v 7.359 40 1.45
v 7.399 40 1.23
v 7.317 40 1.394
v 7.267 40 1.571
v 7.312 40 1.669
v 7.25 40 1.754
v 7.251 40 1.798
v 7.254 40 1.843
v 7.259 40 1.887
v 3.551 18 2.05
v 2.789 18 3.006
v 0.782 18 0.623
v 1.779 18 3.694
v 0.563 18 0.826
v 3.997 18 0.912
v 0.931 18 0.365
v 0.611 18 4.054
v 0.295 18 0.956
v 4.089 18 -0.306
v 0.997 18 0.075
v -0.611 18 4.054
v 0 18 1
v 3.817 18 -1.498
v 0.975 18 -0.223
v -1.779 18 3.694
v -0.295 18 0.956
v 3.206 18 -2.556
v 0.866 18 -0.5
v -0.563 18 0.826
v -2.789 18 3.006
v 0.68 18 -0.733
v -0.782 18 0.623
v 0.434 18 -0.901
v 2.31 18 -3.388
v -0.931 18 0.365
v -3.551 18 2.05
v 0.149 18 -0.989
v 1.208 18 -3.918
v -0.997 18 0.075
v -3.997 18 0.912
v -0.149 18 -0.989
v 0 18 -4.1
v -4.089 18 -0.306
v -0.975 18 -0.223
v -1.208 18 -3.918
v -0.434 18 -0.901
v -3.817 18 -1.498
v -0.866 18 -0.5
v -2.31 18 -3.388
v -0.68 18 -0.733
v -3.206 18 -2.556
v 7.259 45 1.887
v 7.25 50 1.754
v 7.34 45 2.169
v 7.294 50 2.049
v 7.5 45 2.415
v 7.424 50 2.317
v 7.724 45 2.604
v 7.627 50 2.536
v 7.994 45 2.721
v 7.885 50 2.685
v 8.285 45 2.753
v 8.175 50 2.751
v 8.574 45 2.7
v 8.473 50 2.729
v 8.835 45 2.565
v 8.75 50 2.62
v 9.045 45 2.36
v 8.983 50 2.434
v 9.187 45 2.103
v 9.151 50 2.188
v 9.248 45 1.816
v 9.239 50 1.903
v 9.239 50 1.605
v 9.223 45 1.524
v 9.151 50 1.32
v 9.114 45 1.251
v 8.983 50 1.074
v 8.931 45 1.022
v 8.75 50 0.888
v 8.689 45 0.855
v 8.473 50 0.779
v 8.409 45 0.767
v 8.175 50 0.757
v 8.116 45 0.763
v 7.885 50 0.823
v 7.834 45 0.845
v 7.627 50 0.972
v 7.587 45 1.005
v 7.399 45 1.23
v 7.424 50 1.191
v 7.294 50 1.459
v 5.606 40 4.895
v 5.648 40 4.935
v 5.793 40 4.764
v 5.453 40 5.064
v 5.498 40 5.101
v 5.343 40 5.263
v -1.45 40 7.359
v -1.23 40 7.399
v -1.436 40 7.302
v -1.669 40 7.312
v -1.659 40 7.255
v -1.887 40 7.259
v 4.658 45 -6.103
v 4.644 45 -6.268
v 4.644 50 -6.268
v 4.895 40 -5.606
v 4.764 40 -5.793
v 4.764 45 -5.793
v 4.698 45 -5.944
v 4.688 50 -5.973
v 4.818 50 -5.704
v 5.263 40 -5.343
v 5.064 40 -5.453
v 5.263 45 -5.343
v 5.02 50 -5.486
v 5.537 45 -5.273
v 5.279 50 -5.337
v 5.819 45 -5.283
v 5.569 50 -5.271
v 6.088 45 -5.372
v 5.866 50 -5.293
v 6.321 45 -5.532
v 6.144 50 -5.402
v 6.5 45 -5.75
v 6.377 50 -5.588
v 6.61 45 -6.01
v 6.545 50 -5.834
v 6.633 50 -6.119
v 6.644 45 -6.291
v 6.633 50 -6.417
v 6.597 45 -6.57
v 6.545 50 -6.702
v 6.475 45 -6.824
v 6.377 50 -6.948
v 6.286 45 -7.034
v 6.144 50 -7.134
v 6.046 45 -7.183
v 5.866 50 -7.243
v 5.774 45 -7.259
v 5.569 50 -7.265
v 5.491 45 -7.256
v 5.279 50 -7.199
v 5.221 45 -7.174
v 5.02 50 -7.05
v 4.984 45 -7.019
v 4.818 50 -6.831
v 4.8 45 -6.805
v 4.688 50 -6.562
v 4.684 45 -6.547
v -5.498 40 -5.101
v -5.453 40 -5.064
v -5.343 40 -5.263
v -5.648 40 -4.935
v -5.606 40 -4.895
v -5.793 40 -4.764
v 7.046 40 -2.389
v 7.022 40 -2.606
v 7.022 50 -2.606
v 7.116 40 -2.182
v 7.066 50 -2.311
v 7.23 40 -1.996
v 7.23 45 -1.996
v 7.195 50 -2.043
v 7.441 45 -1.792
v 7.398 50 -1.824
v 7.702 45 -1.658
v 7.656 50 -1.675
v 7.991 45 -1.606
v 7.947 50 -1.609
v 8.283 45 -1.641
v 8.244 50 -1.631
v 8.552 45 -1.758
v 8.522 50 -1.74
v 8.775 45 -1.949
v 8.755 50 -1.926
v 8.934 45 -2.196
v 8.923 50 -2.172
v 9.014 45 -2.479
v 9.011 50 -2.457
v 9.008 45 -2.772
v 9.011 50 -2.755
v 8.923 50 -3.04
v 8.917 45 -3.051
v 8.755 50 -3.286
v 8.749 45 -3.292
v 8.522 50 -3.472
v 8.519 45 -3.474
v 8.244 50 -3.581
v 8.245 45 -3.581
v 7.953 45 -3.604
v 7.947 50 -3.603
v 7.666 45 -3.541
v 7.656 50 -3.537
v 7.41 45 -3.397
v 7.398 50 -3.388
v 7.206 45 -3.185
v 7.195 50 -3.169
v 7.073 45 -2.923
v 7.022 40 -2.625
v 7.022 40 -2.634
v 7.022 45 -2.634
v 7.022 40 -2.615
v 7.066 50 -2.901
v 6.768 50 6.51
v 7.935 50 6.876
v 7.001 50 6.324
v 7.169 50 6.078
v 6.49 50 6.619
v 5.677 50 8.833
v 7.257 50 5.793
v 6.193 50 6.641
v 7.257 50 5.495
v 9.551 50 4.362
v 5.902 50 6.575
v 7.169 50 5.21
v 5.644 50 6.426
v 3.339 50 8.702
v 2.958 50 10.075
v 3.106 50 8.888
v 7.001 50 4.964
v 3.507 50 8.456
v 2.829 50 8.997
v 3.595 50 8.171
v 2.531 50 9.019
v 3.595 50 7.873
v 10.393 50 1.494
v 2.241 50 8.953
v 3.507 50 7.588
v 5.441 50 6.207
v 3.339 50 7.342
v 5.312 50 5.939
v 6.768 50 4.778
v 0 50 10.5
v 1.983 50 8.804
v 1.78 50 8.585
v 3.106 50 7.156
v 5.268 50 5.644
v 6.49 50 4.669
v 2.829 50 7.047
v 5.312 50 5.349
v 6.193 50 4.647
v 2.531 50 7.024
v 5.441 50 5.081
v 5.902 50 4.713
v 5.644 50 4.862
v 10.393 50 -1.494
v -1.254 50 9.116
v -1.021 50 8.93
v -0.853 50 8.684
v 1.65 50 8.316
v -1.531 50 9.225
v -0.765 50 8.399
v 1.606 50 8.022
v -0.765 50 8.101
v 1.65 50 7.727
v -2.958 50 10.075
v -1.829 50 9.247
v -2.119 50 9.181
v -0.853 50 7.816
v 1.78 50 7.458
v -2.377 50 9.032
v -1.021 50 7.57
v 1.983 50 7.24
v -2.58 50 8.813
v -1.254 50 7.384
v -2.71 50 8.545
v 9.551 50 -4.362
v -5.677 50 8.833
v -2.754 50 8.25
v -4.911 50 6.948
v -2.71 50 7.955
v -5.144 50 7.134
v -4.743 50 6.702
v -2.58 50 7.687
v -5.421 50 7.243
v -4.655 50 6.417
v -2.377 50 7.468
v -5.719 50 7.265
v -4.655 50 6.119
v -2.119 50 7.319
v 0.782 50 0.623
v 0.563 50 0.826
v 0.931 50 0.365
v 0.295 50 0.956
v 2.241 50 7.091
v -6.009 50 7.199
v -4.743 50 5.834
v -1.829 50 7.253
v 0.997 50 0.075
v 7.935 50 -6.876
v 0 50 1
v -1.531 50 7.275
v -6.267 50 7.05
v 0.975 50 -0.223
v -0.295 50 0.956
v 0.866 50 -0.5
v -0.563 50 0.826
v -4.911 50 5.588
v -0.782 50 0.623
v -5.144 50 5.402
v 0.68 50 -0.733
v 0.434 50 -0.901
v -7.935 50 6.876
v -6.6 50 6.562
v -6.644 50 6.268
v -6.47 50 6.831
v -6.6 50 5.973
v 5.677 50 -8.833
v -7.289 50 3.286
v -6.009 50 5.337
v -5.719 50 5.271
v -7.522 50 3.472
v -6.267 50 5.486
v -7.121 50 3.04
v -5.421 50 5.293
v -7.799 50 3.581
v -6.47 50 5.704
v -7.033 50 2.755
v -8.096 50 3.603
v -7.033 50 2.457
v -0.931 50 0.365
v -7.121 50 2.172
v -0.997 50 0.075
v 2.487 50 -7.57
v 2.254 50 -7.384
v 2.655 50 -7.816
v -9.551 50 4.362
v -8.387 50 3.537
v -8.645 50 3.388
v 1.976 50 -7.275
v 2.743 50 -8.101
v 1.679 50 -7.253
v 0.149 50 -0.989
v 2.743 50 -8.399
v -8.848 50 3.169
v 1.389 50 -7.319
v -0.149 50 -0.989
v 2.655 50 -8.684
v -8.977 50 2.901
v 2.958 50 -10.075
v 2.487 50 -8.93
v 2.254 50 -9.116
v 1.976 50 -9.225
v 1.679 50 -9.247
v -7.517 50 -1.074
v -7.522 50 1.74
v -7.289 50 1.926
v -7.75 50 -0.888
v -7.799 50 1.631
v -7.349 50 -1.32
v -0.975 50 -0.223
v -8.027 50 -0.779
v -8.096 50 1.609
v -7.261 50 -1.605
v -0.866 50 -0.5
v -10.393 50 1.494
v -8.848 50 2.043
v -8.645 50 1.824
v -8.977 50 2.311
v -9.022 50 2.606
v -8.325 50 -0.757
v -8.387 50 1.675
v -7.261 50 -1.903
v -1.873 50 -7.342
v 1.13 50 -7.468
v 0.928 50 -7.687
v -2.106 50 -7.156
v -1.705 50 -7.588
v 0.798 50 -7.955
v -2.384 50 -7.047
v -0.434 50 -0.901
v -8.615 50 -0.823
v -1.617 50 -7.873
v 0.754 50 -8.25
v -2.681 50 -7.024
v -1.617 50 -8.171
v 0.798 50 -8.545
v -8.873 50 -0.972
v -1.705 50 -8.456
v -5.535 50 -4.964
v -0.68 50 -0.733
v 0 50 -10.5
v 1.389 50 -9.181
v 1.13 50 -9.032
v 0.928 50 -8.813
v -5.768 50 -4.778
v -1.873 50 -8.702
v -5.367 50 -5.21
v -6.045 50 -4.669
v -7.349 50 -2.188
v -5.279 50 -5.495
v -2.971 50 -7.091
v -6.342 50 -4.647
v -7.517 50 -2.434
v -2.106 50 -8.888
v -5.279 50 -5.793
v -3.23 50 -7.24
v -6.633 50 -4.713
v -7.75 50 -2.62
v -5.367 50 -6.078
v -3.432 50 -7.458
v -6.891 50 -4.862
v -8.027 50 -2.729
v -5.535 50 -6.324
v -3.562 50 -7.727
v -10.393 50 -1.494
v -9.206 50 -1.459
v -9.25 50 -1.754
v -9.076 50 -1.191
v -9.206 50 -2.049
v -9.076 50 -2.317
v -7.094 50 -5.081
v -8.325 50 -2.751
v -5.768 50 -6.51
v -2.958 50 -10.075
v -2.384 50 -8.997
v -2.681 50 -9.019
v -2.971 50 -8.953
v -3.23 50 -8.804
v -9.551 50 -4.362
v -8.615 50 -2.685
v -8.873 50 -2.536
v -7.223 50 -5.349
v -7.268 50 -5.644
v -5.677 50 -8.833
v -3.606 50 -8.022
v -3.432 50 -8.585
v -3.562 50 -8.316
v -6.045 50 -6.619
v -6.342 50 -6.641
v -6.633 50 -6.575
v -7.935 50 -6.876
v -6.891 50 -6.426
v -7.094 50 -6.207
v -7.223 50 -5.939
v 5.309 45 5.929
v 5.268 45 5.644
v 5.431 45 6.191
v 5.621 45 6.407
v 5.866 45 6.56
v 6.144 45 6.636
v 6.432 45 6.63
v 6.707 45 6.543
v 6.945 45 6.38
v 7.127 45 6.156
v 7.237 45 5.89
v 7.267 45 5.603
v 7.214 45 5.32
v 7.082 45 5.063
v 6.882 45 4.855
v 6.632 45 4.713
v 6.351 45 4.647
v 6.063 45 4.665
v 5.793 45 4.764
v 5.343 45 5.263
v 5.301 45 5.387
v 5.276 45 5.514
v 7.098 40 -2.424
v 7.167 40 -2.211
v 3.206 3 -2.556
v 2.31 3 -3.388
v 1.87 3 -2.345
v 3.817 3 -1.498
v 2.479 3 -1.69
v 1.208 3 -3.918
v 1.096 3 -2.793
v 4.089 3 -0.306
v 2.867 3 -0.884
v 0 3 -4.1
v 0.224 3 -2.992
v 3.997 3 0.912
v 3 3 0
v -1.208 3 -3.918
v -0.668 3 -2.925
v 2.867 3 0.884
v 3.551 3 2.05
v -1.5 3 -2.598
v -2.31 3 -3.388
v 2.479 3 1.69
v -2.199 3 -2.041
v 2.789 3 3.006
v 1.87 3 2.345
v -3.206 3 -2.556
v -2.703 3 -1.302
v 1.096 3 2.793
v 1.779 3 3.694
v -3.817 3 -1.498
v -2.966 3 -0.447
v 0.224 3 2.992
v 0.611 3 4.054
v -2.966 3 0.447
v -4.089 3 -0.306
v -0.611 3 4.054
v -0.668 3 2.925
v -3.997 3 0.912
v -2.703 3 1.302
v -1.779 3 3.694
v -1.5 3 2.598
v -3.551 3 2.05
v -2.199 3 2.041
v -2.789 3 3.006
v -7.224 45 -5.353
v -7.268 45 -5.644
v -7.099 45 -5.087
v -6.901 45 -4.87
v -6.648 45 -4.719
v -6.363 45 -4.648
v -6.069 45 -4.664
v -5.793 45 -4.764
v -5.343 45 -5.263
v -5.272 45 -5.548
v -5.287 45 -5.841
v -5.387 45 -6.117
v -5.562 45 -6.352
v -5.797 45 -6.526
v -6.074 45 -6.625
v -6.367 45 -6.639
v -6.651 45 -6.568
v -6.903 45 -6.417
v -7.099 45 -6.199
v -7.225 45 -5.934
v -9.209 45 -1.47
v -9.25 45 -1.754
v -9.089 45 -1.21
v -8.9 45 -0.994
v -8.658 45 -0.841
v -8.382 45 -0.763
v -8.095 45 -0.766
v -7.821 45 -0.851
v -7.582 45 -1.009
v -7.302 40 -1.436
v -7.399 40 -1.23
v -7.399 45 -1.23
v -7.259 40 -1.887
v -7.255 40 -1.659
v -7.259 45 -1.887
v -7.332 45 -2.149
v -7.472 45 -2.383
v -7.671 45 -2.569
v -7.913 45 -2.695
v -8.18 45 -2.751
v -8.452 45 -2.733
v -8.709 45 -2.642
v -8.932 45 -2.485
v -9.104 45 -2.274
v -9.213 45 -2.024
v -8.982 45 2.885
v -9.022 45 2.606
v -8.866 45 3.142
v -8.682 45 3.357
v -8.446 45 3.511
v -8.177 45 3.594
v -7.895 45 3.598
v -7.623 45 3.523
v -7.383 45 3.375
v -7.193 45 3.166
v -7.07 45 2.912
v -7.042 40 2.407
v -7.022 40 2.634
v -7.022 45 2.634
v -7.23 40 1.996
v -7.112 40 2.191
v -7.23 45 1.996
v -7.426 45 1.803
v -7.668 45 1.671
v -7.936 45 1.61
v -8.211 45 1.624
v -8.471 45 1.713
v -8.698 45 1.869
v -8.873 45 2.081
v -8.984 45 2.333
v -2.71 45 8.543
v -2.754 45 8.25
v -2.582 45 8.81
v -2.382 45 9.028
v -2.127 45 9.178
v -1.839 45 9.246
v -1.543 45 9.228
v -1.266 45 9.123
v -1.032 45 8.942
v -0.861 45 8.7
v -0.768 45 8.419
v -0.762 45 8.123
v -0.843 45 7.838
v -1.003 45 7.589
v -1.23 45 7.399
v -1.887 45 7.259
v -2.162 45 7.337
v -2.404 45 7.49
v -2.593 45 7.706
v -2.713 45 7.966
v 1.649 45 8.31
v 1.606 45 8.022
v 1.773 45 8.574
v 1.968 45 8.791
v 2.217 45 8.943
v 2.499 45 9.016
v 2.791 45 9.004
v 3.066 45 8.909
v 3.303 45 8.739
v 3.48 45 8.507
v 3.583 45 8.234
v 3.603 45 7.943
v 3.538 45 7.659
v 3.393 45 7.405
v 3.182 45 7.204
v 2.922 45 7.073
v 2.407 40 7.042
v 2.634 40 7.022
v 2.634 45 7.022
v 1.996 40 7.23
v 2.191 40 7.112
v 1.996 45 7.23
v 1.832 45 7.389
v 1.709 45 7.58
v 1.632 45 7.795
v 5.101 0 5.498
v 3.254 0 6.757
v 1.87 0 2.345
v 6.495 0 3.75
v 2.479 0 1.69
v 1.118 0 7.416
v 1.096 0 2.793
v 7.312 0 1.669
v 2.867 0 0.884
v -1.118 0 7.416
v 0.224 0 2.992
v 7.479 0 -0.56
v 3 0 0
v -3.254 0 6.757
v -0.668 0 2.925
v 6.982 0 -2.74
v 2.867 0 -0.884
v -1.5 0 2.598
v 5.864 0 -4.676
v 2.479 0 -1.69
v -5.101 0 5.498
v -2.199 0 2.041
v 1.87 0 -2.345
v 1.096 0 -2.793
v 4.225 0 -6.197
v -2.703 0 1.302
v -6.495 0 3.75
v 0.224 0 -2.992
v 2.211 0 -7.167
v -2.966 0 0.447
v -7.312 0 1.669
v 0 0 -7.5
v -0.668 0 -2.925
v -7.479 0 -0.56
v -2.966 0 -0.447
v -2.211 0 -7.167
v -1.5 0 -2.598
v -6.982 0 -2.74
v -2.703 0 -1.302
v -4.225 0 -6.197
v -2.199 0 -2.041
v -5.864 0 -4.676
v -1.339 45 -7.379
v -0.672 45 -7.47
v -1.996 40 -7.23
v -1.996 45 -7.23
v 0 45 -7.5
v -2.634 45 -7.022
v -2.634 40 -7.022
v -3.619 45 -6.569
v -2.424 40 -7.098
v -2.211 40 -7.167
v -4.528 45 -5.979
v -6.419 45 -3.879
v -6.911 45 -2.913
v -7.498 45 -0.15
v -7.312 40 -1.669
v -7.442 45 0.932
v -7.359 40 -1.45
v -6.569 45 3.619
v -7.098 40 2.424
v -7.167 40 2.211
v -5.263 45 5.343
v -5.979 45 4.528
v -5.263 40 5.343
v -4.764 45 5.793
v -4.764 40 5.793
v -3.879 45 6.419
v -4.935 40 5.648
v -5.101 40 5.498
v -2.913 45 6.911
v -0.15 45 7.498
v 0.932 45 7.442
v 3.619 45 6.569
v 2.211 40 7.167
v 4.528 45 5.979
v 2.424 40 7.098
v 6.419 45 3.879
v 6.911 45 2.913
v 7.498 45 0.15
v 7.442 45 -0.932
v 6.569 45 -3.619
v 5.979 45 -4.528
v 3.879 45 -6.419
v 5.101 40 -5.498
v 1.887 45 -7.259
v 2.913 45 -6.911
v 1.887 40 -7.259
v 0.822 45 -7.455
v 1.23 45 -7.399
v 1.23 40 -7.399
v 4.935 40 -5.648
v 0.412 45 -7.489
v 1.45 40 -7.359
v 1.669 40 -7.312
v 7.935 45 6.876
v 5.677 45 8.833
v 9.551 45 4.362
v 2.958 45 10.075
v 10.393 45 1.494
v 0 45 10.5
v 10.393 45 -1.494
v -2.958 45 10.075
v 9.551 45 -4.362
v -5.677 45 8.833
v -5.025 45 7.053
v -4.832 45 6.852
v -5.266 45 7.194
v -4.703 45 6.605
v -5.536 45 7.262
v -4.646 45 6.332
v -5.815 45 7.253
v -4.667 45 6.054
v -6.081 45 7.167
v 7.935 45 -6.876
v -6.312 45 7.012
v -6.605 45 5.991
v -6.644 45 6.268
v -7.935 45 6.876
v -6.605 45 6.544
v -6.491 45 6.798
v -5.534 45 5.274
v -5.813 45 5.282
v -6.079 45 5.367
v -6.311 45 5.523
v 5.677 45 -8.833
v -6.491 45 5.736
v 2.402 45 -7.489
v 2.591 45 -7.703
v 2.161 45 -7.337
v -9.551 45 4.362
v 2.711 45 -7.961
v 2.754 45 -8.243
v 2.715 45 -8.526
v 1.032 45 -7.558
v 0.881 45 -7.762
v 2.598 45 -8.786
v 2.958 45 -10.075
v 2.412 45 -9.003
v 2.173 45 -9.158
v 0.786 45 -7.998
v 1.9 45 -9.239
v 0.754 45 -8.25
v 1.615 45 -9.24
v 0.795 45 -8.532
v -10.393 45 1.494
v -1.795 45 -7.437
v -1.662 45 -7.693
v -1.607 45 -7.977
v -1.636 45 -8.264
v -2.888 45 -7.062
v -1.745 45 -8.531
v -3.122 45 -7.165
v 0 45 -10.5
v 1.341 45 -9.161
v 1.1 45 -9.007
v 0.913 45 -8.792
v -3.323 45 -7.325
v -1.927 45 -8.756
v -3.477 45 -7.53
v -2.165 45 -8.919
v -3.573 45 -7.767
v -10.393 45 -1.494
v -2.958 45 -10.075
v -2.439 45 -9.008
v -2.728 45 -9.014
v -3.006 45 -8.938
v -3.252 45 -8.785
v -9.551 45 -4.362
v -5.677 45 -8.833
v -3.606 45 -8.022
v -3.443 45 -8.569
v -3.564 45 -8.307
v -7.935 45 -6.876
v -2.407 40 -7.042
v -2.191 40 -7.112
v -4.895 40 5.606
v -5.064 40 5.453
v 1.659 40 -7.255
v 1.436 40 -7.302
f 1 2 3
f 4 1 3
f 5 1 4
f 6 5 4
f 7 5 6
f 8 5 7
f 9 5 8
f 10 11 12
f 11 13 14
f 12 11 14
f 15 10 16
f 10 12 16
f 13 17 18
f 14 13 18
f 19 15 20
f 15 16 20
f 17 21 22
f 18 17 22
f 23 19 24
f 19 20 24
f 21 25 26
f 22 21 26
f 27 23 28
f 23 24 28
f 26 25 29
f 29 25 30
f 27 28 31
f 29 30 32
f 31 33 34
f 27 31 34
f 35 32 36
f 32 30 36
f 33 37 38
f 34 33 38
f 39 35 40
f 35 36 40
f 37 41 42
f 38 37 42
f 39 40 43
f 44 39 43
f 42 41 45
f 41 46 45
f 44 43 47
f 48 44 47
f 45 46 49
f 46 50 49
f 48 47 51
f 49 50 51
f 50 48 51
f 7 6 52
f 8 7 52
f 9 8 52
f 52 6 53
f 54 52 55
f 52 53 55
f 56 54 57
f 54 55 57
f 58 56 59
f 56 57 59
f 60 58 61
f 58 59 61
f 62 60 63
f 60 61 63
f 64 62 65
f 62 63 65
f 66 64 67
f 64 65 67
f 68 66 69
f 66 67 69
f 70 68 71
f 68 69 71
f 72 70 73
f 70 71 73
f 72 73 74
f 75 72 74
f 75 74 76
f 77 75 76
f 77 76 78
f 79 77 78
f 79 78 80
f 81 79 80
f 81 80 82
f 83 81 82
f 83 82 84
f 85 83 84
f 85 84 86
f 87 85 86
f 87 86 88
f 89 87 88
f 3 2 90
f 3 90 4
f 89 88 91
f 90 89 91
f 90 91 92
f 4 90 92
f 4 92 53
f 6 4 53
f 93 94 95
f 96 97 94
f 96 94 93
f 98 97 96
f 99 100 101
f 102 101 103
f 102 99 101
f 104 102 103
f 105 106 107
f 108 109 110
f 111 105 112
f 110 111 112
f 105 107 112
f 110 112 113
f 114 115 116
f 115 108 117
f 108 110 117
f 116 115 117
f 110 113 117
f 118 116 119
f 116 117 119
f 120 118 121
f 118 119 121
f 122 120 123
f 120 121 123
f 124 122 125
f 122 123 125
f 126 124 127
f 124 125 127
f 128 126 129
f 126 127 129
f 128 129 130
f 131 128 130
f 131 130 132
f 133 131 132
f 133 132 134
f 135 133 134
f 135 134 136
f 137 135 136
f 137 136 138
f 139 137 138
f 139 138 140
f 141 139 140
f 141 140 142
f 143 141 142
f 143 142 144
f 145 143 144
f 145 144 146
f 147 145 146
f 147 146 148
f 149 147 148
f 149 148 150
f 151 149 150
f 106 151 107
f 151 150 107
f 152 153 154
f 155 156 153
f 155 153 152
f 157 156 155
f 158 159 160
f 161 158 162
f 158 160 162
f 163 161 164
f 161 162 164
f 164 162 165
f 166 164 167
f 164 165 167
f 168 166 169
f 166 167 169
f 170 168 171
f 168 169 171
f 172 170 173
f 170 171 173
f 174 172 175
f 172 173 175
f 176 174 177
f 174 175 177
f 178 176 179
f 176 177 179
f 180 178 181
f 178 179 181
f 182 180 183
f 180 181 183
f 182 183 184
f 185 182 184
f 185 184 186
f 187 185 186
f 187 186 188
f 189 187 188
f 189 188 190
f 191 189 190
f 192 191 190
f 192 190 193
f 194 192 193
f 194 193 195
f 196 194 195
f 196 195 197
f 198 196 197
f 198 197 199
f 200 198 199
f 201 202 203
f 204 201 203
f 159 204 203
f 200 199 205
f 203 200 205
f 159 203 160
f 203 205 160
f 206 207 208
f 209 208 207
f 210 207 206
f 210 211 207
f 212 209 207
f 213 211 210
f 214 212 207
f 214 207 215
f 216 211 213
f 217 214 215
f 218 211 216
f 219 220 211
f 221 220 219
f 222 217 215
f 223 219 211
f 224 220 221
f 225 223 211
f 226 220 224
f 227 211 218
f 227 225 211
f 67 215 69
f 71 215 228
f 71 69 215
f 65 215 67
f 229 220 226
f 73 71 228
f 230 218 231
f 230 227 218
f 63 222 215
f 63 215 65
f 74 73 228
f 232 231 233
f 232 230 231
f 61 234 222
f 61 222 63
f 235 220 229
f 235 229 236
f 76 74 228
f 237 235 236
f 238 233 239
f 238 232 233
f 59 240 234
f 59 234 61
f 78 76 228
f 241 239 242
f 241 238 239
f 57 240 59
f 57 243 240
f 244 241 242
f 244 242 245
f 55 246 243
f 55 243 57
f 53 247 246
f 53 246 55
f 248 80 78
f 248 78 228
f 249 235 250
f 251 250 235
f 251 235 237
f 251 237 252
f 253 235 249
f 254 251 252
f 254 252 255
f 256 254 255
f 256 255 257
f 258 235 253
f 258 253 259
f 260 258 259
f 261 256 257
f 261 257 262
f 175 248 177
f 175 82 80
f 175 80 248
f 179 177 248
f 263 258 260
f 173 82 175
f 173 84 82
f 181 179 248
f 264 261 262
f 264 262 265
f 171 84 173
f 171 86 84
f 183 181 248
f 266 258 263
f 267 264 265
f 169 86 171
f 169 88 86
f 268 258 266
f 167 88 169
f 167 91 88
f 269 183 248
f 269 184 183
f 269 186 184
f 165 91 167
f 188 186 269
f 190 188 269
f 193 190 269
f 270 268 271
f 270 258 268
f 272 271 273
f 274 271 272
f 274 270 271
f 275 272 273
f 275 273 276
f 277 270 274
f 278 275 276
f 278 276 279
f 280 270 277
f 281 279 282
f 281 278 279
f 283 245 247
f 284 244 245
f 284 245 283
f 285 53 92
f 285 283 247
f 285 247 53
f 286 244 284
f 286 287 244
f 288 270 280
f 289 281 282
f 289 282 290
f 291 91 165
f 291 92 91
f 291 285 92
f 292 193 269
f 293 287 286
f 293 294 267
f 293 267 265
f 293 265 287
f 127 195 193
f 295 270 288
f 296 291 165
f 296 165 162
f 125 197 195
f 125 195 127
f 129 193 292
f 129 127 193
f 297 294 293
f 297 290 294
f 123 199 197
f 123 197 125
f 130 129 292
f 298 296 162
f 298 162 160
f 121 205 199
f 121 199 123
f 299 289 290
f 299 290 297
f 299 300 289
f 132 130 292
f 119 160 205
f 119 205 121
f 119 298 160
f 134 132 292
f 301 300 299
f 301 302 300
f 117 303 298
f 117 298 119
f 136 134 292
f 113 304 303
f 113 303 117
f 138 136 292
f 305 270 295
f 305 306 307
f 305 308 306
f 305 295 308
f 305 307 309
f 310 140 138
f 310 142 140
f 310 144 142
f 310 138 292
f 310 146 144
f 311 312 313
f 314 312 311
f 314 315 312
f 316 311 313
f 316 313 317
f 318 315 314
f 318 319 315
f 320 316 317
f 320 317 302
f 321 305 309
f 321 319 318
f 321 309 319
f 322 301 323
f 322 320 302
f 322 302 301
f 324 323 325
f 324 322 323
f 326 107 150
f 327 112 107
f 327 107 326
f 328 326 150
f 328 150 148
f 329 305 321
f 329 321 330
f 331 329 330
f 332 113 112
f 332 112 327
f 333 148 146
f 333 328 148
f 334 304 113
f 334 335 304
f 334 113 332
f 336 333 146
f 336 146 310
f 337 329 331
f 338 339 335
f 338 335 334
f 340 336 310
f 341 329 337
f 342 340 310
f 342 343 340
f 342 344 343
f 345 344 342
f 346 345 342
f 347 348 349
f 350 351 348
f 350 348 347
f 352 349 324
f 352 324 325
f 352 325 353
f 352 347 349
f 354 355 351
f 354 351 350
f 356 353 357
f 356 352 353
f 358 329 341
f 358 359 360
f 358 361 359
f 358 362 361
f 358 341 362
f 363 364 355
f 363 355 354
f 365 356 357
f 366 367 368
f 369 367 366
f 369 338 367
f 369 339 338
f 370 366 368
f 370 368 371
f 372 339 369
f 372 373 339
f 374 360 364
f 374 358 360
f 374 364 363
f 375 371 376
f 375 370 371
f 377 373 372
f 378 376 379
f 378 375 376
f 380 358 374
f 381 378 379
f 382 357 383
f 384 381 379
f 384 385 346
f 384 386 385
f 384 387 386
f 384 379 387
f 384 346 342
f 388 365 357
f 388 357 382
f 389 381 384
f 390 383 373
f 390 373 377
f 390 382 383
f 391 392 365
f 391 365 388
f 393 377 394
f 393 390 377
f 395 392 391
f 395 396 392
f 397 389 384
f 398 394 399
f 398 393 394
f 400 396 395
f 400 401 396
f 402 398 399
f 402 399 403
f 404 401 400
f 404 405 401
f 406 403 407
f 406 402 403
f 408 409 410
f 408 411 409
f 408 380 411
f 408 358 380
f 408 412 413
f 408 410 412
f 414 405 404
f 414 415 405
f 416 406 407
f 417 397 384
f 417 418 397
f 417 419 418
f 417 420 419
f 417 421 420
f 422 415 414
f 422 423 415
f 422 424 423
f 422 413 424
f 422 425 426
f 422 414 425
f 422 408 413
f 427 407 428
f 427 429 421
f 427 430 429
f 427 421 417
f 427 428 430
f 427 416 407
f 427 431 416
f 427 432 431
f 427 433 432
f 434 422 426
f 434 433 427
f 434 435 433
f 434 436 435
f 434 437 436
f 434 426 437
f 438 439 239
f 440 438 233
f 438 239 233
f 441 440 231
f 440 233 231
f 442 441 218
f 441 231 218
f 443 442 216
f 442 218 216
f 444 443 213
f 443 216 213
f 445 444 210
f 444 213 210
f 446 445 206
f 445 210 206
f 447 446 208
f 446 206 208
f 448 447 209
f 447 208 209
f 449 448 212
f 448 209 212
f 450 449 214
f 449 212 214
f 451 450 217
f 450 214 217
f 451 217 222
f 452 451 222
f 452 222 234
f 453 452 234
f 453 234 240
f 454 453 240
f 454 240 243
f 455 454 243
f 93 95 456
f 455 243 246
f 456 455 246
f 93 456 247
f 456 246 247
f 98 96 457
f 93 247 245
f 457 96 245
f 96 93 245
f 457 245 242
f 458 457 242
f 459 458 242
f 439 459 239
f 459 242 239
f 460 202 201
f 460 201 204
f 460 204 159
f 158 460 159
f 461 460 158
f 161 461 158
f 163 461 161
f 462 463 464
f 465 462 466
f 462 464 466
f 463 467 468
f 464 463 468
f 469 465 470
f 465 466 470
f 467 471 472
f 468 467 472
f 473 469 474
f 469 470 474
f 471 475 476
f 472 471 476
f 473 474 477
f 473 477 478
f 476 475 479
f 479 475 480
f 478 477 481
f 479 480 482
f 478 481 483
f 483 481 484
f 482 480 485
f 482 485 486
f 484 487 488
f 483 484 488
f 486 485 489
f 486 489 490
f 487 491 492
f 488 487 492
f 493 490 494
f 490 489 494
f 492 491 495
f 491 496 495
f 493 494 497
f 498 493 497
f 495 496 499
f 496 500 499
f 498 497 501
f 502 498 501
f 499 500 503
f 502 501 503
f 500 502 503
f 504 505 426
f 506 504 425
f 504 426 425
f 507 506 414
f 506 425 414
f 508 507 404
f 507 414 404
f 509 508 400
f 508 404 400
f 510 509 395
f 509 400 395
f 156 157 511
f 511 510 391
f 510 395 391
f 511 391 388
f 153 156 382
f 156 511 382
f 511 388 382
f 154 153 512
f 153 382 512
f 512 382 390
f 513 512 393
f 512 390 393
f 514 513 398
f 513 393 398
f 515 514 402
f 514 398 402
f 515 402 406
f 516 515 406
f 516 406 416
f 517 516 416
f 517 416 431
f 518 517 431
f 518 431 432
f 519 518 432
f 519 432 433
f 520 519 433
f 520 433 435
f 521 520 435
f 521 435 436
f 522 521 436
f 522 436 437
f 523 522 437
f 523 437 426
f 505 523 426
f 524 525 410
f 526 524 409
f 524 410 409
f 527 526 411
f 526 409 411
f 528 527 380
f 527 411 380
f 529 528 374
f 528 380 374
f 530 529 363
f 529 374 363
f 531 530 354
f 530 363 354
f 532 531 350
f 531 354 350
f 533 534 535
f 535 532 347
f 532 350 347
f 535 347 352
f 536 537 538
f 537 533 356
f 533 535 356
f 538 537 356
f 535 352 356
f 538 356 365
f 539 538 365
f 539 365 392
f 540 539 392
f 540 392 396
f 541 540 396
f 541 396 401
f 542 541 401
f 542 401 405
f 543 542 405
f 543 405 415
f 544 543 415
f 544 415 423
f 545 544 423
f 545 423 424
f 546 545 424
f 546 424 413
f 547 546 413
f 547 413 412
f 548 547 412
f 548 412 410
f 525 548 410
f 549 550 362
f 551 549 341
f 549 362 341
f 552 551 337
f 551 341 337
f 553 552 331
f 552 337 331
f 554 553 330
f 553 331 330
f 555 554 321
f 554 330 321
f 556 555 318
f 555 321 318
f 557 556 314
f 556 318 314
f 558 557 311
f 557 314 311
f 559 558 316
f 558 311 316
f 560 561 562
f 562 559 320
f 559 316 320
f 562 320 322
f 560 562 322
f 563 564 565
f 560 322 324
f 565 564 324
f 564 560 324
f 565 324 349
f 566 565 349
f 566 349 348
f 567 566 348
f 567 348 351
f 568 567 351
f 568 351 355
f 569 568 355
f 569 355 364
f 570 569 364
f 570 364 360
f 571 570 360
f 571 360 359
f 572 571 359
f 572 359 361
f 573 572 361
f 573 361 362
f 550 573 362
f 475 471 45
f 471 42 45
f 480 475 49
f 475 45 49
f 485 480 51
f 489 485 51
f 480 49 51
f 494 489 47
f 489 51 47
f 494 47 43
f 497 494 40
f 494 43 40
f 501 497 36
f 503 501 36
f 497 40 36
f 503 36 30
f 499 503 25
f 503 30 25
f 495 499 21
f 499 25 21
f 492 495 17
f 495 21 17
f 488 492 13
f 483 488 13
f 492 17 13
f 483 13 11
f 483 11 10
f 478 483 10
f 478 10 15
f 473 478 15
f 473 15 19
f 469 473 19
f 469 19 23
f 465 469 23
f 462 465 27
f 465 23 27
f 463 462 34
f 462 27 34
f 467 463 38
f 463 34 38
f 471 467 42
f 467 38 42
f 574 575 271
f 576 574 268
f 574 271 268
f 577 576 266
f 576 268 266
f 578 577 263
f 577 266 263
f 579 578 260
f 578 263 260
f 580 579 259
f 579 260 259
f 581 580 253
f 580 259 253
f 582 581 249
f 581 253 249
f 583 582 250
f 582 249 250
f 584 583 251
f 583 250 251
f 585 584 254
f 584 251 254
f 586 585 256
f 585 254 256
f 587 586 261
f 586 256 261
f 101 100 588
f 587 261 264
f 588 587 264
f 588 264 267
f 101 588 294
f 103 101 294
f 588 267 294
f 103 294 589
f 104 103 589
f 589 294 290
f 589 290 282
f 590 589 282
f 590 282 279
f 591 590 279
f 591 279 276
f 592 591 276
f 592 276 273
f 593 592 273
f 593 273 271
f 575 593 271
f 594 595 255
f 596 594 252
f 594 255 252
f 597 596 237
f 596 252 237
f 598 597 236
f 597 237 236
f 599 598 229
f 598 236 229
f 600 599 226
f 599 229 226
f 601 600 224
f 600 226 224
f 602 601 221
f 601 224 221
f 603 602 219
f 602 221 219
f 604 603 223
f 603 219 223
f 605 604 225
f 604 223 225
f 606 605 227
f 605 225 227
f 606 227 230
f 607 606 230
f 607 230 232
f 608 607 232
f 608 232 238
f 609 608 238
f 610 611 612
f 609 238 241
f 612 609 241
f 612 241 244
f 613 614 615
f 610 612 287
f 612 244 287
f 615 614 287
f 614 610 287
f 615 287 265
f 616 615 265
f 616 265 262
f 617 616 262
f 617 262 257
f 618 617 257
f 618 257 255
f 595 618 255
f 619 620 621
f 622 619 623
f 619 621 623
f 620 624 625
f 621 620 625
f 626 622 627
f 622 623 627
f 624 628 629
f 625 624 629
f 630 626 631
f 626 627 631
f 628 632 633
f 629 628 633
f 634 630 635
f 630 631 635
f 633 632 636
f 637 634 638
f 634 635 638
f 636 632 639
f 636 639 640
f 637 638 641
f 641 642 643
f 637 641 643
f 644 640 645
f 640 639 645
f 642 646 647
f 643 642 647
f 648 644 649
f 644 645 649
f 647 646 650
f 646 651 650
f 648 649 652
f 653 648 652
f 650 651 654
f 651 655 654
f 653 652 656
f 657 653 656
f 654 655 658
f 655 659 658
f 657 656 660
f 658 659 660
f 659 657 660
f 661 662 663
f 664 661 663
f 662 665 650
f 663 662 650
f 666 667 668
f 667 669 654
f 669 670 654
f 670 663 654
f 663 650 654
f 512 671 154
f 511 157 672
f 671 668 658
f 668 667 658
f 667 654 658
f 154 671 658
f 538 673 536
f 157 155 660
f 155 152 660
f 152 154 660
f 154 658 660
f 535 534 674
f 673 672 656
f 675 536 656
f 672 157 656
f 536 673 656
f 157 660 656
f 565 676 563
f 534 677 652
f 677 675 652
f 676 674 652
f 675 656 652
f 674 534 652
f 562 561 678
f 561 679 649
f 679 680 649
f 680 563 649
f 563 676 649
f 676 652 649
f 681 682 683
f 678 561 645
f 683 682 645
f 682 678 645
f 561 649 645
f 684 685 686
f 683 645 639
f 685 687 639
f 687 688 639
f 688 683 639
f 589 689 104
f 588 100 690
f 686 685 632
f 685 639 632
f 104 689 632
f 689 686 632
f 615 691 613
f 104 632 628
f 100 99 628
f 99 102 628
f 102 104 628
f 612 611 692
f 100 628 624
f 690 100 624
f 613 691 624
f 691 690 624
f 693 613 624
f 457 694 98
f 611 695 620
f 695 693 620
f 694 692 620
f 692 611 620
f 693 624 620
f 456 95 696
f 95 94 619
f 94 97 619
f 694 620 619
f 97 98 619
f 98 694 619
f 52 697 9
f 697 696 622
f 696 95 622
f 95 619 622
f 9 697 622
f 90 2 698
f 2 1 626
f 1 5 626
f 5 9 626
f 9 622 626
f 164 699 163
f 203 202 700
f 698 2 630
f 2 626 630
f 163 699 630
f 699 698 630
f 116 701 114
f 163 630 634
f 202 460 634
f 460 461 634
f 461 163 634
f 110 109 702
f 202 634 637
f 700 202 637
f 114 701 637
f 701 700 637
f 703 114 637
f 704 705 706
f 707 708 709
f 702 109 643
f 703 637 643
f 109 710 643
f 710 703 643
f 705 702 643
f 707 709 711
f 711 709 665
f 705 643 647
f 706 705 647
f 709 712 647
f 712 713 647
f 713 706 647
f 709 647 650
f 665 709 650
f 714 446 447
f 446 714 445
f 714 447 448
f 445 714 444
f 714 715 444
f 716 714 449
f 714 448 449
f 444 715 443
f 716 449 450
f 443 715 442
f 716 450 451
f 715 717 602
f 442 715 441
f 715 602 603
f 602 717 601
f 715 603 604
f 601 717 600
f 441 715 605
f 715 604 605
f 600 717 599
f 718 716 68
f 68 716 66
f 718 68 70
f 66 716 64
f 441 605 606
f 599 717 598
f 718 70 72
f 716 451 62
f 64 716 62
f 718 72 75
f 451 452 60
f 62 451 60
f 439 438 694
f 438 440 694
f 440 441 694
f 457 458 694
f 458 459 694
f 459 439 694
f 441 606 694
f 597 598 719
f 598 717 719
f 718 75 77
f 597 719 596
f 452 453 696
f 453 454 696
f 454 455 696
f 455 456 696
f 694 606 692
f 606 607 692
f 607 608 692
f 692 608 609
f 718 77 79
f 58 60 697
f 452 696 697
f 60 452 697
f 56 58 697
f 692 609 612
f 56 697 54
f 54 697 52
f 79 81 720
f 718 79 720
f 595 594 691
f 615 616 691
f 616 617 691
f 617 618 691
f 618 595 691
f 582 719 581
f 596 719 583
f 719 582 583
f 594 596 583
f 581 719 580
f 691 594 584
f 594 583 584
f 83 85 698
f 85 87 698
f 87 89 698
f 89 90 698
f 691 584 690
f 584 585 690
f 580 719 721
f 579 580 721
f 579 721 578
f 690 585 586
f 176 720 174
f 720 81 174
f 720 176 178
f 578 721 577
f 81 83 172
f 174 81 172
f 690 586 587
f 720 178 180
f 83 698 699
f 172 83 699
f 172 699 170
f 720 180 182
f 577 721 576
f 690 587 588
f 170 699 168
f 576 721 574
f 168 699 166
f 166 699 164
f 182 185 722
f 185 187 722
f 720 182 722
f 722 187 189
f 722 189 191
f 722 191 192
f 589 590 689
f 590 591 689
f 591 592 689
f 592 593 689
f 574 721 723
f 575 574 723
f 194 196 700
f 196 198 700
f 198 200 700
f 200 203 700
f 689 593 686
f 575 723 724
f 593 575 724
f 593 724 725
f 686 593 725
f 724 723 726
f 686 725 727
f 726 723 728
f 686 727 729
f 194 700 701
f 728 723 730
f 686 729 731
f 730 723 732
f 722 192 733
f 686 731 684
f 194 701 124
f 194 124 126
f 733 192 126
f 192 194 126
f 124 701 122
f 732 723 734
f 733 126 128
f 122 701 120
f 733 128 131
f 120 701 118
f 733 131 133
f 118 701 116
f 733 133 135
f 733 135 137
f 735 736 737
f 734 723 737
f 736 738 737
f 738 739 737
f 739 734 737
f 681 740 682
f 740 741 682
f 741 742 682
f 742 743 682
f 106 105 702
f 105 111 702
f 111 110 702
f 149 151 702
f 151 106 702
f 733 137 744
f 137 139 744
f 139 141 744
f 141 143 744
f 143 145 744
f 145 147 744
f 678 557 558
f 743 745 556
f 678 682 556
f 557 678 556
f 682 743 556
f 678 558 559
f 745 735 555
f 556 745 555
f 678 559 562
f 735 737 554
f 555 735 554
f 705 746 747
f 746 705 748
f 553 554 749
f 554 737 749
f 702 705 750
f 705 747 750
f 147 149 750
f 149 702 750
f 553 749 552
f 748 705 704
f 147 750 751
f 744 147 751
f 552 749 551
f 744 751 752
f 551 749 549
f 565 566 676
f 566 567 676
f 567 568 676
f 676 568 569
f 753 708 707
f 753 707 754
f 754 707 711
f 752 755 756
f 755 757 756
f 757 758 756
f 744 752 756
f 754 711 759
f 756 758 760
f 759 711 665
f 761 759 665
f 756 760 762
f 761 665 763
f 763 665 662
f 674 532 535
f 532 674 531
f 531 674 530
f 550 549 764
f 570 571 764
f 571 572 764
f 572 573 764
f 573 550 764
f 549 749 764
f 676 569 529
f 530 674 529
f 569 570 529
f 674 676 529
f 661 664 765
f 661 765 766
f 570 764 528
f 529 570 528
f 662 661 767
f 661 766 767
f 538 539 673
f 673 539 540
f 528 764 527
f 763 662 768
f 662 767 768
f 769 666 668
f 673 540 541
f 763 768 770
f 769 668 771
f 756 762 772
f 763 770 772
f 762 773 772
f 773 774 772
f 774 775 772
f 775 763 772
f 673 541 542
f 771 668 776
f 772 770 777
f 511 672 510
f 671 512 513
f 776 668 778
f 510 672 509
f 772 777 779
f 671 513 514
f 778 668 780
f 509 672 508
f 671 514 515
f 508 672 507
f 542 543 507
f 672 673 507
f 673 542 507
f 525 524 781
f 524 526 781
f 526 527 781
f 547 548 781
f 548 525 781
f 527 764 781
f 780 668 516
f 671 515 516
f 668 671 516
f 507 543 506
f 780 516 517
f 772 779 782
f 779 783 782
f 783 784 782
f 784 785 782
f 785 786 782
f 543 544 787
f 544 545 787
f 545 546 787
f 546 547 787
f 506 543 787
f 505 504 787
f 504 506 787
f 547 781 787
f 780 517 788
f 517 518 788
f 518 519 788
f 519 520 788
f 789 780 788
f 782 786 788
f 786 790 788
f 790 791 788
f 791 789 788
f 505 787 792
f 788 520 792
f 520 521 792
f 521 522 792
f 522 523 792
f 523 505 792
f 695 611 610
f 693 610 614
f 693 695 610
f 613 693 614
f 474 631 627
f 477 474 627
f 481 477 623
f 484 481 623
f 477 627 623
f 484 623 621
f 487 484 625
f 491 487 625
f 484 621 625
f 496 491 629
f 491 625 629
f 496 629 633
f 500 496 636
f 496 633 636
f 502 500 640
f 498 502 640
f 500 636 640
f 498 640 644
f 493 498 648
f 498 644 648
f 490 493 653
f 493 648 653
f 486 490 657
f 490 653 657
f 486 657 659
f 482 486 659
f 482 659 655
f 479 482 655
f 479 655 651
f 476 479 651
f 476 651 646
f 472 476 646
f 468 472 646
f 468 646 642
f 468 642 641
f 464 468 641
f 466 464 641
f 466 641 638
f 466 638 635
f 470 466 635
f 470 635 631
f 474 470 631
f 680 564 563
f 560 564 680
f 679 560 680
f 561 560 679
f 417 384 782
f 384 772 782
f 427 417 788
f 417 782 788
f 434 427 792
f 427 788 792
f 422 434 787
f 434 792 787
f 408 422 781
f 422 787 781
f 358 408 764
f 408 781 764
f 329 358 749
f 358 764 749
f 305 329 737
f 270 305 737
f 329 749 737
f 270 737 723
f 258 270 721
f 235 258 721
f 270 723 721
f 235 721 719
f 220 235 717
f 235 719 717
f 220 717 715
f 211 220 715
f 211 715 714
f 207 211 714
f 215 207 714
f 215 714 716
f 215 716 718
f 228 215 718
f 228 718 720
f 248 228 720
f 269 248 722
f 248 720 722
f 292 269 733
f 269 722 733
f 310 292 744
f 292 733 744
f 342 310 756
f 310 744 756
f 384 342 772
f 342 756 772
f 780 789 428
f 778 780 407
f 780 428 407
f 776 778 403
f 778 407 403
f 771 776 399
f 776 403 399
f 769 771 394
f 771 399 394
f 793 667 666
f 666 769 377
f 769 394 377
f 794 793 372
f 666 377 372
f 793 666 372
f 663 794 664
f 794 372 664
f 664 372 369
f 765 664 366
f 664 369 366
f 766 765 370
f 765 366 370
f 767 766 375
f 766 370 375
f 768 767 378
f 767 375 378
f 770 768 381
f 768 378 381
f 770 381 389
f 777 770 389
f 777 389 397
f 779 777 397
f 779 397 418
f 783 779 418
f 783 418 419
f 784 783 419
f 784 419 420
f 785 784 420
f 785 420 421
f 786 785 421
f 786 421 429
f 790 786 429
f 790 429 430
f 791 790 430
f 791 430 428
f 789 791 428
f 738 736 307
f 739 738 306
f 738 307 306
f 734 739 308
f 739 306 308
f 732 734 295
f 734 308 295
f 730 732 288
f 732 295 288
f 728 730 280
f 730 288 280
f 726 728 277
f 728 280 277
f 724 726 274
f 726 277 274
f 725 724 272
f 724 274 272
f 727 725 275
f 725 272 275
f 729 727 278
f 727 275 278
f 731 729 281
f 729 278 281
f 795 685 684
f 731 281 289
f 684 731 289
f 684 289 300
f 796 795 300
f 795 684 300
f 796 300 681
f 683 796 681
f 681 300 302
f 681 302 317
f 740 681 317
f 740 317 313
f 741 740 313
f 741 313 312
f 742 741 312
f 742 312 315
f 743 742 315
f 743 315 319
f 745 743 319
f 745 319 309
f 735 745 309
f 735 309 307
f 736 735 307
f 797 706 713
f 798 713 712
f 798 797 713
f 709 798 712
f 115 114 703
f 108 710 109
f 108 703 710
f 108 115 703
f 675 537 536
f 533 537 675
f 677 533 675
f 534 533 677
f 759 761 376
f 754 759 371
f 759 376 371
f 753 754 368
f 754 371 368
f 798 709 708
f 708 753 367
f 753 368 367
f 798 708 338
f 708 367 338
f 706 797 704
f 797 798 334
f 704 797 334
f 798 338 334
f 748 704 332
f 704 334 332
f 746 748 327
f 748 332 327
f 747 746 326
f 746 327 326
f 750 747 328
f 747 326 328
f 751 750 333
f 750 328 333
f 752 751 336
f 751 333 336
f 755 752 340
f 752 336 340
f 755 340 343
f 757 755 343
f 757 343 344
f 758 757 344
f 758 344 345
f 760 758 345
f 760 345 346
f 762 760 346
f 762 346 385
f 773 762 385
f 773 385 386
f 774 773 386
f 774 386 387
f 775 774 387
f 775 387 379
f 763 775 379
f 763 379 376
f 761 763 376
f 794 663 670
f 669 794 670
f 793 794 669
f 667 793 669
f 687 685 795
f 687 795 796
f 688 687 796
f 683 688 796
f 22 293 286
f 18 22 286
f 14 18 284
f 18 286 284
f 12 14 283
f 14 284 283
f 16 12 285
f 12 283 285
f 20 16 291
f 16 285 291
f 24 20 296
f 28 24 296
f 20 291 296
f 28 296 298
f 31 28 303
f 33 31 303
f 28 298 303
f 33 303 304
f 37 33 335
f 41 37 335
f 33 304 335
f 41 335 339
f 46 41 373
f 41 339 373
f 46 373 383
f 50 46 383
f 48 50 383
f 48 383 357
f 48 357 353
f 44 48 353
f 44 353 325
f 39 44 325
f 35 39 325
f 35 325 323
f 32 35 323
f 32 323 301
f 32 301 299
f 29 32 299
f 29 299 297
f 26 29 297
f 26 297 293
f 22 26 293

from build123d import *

# Parameters (mm, degrees)
SKETCH2_R          = 1
CUT_EXTRUDE1_DEPTH = 10
SKETCH3_R          = 3
CUT_EXTRUDE3_DEPTH = 10
SKETCH4_R          = 1
CUT_EXTRUDE4_DEPTH = 53.158412553


with BuildPart() as part:
    # Sketch1 → Revolve1 (revolve)
    with BuildSketch(Plane.XY, mode=Mode.PRIVATE) as revolve1_sk:
        Polygon((0, 0), (0, 3), (4.1, 3), (4.1, 18), (0, 18), (0, 50), (7.5, 50), (10.5, 50), (10.5, 45), (7.5, 45), (7.5, 0), align=None)
    revolve(revolve1_sk.sketch.rotate(Axis((0, 18, 0), (0, 1, 0)), 90), axis=Axis((0, 18, 0), (0, 1, 0)))

    # Sketch2 → Cut-Extrude1 (cut)
    with BuildSketch(Plane(origin=(0, 50, 0), x_dir=(1, 0, 0), z_dir=(0, 1, 0))):
        with Locations(Location((-2.60602925, 8.021687752, 0), (0, 0, 180))):
            Circle(SKETCH2_R)
        with Locations(Location((1.753956343, 8.25, 0), (0, 0, 180))):
            Circle(SKETCH2_R)
        with Locations(Location((5.64397075, 6.26773141, 0), (0, 0, 180))):
            Circle(SKETCH2_R)
        with Locations(Location((8.021687752, 2.60602925, 0), (0, 0, 180))):
            Circle(SKETCH2_R)
        with Locations(Location((8.25, -1.753956343, 0), (0, 0, 180))):
            Circle(SKETCH2_R)
        with Locations(Location((6.26773141, -5.64397075, 0), (0, 0, 180))):
            Circle(SKETCH2_R)
        with Locations(Location((2.60602925, -8.021687752, 0), (0, 0, 180))):
            Circle(SKETCH2_R)
        with Locations(Location((-1.753956343, -8.25, 0), (0, 0, 180))):
            Circle(SKETCH2_R)
        with Locations(Location((-5.64397075, -6.26773141, 0), (0, 0, 180))):
            Circle(SKETCH2_R)
        with Locations(Location((-8.021687752, -2.60602925, 0), (0, 0, 180))):
            Circle(SKETCH2_R)
        with Locations(Location((-8.25, 1.753956343, 0), (0, 0, 180))):
            Circle(SKETCH2_R)
        with Locations(Location((-6.26773141, 5.64397075, 0), (0, 0, 180))):
            Circle(SKETCH2_R)
    extrude(amount=-CUT_EXTRUDE1_DEPTH, mode=Mode.SUBTRACT)

    # Sketch3 → Cut-Extrude3 (cut)
    with BuildSketch(Plane.XZ):
        Circle(SKETCH3_R)
    extrude(amount=-CUT_EXTRUDE3_DEPTH, mode=Mode.SUBTRACT)

    # Sketch4 → Cut-Extrude4 (cut, through all)
    with BuildSketch(Plane(origin=(0, 50, 0), x_dir=(1, 0, 0), z_dir=(0, 1, 0))):
        with Locations(Location((0, 0, 0), (0, 0, 270))):
            Circle(SKETCH4_R)
    extrude(amount=-CUT_EXTRUDE4_DEPTH, mode=Mode.SUBTRACT)


solid = part.part
